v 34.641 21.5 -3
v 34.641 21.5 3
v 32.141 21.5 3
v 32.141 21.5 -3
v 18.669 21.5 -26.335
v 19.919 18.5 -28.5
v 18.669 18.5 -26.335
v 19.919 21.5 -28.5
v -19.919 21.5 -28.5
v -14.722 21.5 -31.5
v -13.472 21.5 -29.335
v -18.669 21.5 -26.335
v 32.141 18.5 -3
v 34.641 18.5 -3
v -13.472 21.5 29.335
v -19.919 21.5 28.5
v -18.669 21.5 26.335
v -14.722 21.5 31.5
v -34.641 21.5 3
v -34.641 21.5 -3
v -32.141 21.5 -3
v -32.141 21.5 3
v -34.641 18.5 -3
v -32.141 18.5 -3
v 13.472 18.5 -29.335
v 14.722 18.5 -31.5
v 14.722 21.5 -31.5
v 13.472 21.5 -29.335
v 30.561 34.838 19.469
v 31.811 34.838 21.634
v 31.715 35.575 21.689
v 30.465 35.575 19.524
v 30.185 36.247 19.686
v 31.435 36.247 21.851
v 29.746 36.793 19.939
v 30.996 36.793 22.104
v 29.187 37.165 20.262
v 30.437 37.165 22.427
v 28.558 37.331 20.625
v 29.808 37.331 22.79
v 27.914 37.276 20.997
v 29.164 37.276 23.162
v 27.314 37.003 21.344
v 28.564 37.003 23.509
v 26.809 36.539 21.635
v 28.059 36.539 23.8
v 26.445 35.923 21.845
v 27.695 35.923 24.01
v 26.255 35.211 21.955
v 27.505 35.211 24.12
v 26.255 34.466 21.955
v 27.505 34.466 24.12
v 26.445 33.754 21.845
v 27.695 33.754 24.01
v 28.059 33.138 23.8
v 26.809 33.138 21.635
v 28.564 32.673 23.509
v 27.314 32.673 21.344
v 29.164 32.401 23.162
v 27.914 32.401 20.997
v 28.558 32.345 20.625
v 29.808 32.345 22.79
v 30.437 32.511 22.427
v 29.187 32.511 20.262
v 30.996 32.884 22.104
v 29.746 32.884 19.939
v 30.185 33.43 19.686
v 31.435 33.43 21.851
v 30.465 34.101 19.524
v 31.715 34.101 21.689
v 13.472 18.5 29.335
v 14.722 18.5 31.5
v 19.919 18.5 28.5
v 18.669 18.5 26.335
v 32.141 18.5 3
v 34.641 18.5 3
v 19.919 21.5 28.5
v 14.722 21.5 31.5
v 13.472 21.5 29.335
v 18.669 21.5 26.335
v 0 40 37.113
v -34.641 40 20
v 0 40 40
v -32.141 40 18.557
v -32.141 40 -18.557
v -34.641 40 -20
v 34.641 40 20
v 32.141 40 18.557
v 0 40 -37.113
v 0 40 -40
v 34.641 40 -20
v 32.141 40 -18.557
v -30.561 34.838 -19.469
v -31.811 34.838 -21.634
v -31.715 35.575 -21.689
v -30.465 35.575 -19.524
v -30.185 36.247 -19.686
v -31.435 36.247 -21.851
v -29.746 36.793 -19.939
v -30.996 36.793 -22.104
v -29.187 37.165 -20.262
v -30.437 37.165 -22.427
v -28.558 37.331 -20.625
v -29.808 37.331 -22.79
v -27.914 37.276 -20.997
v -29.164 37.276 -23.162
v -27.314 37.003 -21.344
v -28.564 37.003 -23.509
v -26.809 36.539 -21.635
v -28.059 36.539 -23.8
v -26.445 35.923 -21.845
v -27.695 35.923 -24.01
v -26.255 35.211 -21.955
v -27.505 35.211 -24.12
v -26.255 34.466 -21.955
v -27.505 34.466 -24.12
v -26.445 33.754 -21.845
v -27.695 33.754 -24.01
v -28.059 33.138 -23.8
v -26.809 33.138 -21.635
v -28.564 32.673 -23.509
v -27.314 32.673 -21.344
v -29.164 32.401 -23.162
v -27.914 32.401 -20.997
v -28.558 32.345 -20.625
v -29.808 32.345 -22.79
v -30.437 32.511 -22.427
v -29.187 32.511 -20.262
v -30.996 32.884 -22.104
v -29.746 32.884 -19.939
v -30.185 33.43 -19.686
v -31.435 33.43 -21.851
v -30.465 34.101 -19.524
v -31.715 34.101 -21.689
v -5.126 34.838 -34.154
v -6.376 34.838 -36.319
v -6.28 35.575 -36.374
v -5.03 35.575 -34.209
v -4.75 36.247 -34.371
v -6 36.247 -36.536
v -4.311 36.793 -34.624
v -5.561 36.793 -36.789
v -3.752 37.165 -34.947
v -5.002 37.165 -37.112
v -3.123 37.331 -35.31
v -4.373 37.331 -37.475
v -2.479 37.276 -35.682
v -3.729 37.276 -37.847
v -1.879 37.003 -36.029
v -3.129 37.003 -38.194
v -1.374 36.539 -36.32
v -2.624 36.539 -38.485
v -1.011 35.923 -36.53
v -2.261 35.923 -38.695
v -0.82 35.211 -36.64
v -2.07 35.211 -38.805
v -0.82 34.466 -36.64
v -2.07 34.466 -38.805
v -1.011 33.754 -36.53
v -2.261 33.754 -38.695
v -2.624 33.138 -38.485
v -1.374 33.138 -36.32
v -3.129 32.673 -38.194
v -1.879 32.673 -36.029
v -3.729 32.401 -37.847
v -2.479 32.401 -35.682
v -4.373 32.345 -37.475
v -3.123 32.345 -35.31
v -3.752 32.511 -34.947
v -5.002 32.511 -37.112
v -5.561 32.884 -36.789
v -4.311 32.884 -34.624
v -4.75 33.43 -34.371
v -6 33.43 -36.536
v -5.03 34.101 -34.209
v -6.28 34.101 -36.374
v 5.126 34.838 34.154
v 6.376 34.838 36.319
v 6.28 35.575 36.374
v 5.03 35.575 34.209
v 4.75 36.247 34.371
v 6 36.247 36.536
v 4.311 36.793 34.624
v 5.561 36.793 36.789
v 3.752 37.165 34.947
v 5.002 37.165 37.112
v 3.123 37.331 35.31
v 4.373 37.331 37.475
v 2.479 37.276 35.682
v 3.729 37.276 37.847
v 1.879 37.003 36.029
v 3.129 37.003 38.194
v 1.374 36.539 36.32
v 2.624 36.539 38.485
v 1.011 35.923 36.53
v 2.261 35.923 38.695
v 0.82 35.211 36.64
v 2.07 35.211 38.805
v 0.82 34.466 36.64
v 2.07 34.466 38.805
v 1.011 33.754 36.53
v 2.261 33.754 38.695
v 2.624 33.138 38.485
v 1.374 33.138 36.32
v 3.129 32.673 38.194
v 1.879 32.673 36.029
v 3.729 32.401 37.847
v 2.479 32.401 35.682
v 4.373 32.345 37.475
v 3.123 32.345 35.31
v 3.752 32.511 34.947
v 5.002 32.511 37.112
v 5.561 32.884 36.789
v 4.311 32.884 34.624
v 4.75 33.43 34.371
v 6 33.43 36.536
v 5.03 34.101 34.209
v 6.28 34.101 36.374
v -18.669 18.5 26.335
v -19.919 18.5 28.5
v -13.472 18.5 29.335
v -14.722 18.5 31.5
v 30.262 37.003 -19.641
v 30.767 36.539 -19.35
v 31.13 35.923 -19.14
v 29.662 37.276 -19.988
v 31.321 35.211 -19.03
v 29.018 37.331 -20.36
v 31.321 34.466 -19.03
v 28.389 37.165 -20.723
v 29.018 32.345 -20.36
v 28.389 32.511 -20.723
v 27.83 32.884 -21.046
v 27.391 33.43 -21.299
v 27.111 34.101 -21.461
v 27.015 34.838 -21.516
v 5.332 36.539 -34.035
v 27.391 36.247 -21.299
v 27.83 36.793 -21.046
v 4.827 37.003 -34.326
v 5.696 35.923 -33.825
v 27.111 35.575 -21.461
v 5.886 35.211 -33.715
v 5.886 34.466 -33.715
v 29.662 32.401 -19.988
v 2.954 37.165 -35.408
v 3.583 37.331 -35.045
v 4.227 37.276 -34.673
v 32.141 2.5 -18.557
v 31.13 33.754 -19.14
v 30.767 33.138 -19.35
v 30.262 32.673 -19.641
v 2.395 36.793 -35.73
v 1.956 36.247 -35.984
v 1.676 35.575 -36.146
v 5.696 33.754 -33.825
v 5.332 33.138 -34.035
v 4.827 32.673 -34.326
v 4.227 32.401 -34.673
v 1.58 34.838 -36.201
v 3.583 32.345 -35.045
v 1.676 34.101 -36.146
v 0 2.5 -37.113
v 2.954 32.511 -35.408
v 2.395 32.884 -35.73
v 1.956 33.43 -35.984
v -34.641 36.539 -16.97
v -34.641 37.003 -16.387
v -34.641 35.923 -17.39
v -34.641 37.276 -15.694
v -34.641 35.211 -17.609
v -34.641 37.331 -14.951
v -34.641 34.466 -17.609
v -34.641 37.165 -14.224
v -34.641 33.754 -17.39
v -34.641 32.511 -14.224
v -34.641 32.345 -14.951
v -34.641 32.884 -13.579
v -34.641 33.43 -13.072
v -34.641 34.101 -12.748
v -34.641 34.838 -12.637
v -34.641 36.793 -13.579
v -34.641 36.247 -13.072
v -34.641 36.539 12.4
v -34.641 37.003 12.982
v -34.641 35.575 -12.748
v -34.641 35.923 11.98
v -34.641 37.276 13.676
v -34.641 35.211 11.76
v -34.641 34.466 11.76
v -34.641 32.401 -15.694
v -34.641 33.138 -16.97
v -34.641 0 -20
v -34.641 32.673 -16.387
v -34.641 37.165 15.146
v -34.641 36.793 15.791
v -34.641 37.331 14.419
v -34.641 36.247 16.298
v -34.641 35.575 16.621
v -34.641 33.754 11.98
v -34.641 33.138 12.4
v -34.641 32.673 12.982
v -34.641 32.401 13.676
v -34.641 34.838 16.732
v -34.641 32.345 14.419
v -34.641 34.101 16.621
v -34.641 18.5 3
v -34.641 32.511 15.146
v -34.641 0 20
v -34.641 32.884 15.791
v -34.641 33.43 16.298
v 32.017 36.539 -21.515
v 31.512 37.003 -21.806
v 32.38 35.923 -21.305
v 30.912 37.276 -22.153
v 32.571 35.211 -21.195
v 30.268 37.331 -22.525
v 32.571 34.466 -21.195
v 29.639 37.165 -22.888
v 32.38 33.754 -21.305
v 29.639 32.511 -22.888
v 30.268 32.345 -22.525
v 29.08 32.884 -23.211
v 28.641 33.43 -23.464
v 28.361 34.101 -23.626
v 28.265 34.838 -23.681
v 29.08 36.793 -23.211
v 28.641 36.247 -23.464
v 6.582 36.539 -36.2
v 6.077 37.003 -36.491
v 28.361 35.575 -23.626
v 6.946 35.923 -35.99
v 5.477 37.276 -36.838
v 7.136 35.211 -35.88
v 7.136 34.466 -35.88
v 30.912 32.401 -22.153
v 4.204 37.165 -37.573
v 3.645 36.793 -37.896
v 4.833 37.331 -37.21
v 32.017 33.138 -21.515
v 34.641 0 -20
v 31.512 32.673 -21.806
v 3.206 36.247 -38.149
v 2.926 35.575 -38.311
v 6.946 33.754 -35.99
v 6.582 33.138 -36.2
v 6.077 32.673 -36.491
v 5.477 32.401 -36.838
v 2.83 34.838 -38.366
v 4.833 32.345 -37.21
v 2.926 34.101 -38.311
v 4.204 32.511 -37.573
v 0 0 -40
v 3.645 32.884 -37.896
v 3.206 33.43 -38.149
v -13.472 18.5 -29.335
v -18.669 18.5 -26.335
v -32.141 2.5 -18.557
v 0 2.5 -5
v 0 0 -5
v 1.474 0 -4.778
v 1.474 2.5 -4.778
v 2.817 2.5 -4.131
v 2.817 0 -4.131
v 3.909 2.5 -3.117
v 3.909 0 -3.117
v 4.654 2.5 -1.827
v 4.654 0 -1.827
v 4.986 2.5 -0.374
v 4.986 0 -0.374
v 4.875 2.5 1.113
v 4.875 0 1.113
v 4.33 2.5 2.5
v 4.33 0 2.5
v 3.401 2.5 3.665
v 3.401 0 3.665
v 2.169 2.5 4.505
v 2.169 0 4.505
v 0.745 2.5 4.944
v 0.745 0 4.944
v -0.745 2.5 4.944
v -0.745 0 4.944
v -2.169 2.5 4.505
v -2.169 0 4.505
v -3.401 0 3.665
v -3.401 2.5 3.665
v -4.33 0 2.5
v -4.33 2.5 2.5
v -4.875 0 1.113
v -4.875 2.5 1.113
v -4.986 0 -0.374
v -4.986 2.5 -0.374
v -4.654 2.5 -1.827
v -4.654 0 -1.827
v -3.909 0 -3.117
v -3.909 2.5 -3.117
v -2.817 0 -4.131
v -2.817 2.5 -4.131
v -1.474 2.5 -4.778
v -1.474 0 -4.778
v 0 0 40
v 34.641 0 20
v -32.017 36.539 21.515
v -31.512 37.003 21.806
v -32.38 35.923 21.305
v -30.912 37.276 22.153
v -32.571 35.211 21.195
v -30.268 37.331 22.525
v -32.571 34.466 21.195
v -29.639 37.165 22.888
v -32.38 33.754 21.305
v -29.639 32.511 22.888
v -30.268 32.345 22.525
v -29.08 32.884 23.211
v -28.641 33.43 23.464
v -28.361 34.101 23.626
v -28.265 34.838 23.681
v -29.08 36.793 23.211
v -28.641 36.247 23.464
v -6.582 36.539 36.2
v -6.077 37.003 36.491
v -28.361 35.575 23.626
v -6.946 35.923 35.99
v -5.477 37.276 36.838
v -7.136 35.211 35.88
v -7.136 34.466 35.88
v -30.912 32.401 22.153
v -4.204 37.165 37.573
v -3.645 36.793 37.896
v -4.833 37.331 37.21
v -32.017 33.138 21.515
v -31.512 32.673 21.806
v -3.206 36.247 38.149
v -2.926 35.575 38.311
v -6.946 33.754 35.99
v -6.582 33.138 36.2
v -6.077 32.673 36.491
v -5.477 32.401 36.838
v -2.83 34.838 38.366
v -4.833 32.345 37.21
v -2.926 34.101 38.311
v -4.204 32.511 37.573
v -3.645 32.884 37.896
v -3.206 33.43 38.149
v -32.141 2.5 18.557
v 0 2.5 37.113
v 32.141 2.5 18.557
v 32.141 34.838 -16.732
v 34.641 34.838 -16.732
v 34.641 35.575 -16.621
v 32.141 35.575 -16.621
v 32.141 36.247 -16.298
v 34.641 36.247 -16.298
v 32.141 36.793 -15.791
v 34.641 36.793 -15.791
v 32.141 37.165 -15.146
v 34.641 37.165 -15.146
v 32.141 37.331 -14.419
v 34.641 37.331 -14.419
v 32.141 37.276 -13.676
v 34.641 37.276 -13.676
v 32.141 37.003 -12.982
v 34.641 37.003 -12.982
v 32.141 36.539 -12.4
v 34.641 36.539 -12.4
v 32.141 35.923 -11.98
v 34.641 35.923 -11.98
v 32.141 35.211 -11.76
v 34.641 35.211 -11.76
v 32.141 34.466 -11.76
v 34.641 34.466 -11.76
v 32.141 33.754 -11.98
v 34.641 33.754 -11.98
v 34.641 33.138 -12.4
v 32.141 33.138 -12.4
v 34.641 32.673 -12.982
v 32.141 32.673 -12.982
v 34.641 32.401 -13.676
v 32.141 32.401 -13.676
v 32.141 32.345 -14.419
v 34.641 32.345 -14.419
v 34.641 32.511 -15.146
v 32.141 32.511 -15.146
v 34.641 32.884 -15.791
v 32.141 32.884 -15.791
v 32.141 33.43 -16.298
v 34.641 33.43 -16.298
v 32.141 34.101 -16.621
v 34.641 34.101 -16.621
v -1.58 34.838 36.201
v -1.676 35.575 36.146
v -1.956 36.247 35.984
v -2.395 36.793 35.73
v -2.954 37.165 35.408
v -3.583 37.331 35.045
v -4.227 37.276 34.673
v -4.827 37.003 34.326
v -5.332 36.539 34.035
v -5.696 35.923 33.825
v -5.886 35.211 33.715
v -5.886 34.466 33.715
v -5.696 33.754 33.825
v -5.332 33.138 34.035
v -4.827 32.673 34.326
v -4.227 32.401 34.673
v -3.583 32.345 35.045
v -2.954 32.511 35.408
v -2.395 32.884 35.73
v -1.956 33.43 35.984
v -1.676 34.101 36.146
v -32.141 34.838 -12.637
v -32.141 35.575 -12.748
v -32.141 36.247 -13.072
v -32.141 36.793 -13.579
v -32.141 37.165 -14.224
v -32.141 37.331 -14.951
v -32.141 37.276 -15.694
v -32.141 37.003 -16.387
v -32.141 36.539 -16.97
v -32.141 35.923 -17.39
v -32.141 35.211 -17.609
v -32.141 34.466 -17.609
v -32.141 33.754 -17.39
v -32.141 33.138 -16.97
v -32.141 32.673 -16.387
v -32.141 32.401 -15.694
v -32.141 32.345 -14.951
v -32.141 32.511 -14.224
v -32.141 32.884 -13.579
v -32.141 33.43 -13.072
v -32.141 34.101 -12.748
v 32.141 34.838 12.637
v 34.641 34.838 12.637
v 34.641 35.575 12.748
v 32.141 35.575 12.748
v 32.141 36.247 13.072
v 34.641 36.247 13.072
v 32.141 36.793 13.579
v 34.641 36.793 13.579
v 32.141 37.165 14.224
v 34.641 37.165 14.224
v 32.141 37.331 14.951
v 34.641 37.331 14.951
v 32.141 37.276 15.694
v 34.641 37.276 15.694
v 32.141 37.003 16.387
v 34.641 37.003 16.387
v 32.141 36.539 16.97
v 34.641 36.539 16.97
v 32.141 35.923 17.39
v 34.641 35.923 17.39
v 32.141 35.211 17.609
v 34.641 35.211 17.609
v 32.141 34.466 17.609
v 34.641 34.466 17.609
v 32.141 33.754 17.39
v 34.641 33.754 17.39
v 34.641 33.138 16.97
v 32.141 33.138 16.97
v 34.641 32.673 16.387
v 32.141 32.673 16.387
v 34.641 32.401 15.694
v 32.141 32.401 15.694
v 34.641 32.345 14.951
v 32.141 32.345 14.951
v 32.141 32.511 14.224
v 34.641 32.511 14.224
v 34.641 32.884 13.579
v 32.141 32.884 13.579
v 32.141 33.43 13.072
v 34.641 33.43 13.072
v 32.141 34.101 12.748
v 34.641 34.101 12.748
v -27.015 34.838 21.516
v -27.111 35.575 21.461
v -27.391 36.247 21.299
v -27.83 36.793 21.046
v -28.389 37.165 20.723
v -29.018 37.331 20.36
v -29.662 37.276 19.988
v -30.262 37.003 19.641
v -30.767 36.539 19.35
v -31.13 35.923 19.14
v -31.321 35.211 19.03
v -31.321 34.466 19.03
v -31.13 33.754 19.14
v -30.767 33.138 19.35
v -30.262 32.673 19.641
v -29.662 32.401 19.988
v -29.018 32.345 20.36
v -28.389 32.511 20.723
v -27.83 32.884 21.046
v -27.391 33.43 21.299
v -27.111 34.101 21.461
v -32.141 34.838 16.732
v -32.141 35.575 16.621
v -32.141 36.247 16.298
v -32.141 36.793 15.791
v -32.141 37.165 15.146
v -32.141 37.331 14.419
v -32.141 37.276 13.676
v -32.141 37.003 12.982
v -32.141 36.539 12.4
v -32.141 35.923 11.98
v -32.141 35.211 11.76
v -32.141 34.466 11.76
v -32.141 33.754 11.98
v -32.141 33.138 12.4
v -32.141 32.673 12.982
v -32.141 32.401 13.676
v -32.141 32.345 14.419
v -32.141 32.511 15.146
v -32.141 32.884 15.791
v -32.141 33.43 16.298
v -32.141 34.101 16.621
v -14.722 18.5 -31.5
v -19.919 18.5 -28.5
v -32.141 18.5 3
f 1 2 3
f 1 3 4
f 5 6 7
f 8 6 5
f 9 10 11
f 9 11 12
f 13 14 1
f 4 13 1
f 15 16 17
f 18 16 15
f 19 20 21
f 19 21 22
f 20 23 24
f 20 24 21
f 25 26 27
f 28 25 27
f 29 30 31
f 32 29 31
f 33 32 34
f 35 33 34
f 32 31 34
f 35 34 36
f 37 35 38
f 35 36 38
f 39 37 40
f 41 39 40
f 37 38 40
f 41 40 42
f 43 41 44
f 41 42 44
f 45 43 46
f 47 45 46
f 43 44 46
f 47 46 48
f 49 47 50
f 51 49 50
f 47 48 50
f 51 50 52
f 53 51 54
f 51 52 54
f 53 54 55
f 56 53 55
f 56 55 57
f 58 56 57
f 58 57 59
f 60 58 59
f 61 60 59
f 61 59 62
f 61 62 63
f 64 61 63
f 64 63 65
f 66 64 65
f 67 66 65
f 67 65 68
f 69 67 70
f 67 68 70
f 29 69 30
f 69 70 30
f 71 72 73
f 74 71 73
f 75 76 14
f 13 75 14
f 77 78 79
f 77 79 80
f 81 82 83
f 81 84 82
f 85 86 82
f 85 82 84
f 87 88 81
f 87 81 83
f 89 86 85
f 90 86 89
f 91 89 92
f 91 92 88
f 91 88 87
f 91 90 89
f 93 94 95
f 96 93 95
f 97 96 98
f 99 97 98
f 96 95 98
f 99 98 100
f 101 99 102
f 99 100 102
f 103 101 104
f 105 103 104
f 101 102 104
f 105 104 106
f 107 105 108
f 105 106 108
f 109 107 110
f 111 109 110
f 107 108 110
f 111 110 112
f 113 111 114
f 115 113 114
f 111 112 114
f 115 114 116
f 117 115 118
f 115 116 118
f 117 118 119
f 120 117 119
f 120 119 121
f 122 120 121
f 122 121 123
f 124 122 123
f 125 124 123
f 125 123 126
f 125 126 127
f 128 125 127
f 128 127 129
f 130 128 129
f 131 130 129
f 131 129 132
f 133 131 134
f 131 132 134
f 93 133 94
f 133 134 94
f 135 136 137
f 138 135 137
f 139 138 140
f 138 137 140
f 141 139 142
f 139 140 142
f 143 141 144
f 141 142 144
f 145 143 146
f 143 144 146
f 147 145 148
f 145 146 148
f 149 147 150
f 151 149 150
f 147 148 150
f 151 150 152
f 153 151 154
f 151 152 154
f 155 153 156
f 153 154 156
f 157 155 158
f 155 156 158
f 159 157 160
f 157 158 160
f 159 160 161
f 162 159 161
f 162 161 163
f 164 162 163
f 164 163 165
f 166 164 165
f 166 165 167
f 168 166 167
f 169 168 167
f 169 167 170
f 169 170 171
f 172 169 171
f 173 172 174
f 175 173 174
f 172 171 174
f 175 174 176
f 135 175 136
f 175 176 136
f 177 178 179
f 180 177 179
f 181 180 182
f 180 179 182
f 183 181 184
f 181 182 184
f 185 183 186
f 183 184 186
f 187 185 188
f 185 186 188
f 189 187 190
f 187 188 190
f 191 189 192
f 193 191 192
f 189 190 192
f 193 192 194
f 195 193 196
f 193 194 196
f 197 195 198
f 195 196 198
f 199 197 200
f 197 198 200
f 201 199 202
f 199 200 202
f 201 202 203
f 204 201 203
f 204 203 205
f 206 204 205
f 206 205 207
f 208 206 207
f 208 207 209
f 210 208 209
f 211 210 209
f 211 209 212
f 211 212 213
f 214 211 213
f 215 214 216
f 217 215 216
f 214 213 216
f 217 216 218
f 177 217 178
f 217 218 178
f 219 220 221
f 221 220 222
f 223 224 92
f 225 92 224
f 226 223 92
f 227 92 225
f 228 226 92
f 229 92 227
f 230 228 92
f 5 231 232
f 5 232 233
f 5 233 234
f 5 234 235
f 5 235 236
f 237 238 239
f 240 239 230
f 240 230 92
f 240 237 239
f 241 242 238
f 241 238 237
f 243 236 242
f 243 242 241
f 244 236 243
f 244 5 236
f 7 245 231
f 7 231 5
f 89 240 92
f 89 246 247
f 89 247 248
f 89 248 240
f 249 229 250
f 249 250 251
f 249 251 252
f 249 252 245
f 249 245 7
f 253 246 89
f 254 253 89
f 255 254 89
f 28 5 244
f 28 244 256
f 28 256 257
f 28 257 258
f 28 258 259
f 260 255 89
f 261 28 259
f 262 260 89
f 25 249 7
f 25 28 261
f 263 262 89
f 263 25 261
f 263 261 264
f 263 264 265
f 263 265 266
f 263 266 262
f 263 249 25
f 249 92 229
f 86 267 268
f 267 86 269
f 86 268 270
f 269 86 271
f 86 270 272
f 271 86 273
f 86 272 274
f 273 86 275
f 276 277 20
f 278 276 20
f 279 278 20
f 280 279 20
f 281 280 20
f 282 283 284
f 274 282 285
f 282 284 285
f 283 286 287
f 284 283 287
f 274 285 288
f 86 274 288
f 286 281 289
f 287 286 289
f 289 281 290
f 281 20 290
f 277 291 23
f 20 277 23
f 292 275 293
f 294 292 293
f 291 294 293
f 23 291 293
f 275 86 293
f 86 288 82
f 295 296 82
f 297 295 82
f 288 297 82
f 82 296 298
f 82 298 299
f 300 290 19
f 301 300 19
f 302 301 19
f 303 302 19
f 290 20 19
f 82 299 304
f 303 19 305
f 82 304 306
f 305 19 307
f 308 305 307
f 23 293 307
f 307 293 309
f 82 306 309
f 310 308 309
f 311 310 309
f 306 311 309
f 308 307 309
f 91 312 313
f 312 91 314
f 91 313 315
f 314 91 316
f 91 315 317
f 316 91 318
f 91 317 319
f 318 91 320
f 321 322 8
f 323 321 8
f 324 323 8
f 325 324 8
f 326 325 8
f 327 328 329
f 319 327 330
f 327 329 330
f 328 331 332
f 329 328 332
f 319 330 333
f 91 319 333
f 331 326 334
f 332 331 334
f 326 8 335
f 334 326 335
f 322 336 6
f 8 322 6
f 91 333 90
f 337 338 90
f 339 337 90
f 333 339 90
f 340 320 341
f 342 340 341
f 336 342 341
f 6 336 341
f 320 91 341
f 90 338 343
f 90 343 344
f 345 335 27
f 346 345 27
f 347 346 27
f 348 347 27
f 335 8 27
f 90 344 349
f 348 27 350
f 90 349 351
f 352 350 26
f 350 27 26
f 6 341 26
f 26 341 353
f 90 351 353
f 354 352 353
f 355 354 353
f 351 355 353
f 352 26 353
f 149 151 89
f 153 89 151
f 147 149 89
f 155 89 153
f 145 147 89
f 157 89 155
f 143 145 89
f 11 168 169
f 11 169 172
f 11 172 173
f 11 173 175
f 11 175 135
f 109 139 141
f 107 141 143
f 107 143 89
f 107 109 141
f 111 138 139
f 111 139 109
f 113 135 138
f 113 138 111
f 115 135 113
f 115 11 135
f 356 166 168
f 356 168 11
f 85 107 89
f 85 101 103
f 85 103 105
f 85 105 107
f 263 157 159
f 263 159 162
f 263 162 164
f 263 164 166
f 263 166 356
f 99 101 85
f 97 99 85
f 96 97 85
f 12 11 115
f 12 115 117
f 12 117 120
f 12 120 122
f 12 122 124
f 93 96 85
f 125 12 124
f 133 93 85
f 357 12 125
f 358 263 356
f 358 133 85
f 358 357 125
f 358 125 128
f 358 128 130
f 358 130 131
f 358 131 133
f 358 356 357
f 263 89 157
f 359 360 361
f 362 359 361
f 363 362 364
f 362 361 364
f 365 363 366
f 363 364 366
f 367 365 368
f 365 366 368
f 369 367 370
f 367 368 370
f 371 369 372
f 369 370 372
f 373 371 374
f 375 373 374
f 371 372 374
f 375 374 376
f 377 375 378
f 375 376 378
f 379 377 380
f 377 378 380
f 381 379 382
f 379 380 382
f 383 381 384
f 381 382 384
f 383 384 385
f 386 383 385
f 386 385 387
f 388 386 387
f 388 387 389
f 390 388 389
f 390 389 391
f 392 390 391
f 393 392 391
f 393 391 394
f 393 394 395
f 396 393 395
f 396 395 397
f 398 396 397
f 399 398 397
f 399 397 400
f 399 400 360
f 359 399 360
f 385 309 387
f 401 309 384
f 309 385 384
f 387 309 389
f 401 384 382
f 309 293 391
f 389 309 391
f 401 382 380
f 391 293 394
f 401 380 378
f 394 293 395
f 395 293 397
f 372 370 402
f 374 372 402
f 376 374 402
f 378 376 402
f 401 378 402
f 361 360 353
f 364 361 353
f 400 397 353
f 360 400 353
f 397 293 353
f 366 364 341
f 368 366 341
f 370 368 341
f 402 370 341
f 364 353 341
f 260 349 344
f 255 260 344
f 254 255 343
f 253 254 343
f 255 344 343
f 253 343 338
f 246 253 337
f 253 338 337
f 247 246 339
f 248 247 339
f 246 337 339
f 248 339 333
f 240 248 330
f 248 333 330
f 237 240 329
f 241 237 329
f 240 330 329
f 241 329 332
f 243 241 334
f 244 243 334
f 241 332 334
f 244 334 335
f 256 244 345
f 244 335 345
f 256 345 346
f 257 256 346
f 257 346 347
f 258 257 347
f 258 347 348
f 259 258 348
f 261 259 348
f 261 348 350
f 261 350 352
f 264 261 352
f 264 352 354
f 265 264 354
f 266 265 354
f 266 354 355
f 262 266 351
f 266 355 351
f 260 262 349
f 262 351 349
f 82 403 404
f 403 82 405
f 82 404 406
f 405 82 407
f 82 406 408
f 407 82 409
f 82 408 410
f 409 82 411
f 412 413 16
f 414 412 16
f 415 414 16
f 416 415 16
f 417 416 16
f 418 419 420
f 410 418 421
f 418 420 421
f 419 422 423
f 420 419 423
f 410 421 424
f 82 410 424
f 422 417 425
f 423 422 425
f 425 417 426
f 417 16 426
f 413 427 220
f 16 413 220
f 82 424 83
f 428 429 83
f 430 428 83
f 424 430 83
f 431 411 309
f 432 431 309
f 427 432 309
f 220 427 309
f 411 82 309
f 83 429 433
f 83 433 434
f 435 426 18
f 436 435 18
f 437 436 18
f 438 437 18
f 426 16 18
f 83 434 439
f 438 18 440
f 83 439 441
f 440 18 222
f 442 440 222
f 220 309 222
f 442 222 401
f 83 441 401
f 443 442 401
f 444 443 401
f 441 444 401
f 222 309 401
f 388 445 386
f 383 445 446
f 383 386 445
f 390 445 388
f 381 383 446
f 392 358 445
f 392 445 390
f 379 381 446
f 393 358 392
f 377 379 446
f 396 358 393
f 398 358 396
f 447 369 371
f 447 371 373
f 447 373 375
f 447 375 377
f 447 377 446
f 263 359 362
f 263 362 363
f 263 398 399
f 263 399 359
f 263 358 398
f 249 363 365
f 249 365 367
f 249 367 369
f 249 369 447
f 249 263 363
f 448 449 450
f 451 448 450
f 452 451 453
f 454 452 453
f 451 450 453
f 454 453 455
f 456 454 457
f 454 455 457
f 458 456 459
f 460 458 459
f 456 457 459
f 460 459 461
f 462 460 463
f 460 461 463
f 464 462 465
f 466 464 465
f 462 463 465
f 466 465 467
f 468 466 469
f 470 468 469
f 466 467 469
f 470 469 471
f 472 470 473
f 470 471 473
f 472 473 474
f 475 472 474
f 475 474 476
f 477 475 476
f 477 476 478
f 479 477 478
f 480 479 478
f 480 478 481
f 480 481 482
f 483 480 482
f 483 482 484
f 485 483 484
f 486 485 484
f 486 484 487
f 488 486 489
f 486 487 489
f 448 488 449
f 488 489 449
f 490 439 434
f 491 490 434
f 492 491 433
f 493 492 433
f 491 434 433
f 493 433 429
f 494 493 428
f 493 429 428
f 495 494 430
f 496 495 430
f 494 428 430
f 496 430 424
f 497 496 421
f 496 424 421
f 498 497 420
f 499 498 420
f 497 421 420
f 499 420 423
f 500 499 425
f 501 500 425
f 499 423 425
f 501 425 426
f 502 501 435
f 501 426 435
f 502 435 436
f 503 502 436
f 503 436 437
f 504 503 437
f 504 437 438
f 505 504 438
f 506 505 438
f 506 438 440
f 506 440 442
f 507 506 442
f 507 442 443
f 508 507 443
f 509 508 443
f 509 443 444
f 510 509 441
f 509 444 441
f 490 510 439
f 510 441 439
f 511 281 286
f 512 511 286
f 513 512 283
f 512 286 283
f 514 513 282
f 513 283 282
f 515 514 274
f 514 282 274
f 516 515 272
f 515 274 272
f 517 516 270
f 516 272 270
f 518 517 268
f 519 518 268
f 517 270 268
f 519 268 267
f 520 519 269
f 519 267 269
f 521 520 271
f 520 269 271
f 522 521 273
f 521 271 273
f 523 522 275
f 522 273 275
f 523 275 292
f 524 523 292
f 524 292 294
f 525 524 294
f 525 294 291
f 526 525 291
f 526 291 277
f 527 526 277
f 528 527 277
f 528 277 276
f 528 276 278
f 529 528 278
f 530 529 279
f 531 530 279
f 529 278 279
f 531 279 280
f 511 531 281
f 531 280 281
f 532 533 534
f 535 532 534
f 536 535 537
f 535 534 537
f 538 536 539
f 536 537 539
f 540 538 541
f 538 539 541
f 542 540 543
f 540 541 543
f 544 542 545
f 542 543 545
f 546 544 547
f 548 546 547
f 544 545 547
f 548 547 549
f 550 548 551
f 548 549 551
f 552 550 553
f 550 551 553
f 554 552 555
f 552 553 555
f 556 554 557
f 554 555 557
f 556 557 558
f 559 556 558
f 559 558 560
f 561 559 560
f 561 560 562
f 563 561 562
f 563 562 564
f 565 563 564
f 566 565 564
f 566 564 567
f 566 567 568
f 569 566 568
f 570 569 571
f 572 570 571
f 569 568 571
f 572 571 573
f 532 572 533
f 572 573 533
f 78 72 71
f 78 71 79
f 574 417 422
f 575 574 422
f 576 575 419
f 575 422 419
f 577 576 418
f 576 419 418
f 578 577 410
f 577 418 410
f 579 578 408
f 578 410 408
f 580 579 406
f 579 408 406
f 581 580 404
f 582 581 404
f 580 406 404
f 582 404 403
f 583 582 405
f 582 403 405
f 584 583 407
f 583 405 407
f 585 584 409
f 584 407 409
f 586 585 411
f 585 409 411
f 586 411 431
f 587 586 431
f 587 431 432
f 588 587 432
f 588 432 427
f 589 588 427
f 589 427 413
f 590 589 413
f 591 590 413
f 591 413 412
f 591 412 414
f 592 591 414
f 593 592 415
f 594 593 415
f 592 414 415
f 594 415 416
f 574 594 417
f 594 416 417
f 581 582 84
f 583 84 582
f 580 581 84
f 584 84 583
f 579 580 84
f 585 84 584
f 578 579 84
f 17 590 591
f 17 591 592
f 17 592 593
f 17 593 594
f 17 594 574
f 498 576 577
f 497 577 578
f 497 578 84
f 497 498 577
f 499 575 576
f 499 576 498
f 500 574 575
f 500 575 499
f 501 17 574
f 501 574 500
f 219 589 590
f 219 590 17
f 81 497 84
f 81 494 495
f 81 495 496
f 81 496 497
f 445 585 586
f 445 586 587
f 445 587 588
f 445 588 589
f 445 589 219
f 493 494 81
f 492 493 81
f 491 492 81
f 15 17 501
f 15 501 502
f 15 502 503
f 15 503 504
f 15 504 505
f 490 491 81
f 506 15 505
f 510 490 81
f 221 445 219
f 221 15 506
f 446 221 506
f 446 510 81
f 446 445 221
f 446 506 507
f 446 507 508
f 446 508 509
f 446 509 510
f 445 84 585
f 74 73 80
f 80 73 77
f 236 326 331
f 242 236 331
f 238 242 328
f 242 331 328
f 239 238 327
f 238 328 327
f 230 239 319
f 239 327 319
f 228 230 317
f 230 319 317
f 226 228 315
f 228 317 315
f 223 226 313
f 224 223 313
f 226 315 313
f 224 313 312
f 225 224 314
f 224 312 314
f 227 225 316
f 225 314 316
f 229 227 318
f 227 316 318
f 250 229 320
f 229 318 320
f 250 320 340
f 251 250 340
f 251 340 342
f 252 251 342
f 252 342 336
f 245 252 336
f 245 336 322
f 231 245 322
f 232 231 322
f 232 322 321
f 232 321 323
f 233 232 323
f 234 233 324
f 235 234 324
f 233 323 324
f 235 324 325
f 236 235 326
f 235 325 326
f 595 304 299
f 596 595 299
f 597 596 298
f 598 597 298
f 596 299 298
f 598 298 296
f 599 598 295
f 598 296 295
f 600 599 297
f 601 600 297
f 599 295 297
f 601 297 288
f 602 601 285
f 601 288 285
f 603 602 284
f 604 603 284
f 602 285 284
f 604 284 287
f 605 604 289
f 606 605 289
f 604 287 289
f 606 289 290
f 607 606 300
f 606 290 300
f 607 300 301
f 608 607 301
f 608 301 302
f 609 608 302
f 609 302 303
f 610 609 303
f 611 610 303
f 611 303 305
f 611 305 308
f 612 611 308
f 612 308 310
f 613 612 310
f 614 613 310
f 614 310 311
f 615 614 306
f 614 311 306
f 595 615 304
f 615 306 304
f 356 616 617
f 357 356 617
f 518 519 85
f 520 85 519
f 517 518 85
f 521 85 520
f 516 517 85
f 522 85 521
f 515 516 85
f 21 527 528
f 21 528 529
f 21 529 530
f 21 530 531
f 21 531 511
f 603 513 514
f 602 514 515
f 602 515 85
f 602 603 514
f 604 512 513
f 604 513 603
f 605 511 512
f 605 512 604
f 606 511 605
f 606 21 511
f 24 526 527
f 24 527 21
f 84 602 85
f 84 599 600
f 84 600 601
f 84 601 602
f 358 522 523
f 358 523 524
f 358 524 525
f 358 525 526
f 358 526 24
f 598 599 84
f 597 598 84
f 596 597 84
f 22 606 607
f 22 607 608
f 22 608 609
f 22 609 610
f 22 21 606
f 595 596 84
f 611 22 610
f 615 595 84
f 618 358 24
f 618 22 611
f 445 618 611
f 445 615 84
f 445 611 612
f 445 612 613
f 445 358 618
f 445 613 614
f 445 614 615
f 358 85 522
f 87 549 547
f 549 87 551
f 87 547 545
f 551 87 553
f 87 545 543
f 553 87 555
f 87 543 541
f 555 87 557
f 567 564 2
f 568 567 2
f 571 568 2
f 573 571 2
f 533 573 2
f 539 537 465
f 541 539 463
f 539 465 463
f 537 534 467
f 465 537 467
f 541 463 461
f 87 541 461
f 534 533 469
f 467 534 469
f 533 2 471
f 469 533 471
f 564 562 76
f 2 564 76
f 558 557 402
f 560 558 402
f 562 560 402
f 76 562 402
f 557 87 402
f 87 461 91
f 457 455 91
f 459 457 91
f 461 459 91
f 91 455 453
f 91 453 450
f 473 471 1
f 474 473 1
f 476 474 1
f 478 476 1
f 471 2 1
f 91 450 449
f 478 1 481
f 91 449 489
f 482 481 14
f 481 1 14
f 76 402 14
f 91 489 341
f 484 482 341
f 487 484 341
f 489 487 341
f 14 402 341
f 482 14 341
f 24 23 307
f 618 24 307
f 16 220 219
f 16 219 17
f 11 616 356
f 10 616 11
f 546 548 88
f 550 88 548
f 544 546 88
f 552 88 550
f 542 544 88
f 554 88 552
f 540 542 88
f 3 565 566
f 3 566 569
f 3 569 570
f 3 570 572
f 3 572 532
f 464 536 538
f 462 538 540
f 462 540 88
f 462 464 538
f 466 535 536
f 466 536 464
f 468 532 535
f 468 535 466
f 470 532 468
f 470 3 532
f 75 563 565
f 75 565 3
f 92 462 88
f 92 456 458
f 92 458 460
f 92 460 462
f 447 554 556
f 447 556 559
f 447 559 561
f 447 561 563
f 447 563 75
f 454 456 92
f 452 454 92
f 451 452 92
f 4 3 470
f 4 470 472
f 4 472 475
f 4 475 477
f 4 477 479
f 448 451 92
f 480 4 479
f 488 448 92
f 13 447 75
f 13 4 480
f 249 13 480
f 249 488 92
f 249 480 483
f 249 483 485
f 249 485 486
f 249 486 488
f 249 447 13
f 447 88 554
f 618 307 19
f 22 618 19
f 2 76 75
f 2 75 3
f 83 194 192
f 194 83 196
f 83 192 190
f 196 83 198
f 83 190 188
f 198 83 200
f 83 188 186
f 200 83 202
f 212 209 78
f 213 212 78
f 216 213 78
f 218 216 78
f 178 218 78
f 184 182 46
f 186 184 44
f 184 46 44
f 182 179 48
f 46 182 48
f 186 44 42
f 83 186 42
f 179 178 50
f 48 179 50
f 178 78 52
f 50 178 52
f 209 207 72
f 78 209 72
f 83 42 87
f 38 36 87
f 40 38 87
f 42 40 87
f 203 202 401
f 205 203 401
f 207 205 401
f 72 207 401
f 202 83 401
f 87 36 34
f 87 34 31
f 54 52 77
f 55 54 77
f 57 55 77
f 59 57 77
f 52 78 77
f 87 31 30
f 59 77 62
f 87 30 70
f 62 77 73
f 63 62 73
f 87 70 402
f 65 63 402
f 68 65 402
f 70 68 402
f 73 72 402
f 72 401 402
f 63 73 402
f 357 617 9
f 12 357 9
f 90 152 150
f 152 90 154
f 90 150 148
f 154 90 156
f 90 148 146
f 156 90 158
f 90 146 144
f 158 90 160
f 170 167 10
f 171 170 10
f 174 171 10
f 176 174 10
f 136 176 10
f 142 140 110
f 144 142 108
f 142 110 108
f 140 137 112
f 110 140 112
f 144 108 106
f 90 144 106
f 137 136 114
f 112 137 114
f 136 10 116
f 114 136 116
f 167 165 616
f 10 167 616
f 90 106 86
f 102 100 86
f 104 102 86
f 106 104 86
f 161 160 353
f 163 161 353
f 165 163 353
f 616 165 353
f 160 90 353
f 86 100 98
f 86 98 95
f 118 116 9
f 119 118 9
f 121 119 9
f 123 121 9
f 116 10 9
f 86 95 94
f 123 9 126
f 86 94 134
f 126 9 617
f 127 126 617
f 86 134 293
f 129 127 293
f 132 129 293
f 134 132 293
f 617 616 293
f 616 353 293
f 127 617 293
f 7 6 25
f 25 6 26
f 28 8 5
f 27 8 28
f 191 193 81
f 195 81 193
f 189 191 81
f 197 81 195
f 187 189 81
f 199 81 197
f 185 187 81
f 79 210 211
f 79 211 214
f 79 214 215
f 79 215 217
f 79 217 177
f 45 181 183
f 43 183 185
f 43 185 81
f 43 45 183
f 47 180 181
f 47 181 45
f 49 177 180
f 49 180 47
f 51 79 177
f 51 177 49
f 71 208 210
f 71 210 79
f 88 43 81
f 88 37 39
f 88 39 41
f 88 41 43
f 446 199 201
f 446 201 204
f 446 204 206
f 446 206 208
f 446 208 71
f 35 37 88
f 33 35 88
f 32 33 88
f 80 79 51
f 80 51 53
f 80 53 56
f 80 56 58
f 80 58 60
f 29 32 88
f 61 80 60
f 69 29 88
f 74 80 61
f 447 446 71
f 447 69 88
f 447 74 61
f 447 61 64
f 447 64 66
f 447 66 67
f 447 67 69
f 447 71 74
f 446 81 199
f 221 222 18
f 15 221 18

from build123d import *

# Parameters (mm, degrees)
BOSS_EXTRUDE1_DEPTH = 40
SHELL1_T            = -2.5
SKETCH2_R           = 5
CUT_EXTRUDE1_DEPTH  = 40
SKETCH3_R           = 2.5
CUT_EXTRUDE2_DEPTH  = 2.5
SKETCH4_W           = 6
SKETCH4_H           = 3
CUT_EXTRUDE3_DEPTH  = 40
CIRPATTERN1_COUNT   = 6


with BuildPart() as part:
    # Sketch1 → Boss-Extrude1 (new body)
    with BuildSketch(Plane(origin=(0, 0, 0), x_dir=(1, 0, 0), z_dir=(0, 1, 0))):
        Polygon((34.641016151, 20), (0, 40), (-34.641016151, 20), (-34.641016151, -20), (0, -40), (34.641016151, -20), align=None)
    extrude(amount=BOSS_EXTRUDE1_DEPTH)

    # Shell1
    shell1_openings = [part.faces().sort_by_distance(p)[0] for p in [
        (0, 40, 0),
    ]]
    offset(amount=SHELL1_T, openings=shell1_openings, kind=Kind.INTERSECTION)

    # Sketch2 → Cut-Extrude1 (cut)
    with BuildSketch(Plane.XZ):
        with Locations(Location((0, 0, 0), (0, 0, 270))):
            Circle(SKETCH2_R)
    extrude(amount=-CUT_EXTRUDE1_DEPTH, mode=Mode.SUBTRACT)

    # Sketch3 → Cut-Extrude2 (cut)
    with BuildSketch(Plane.ZY.offset(34.641016151)):
        with Locations((-15.137351835, 34.838276852)):
            Circle(SKETCH3_R)
        with Locations((14.232401454, 34.838276852)):
            Circle(SKETCH3_R)
    cut_extrude2 = extrude(amount=-CUT_EXTRUDE2_DEPTH, mode=Mode.SUBTRACT)

    # Sketch4 → Cut-Extrude3 (cut)
    with BuildSketch(Plane.ZY.offset(34.641016151)):
        with Locations((0, 20)):
            Rectangle(SKETCH4_W, SKETCH4_H)
    cut_extrude3 = extrude(amount=-CUT_EXTRUDE3_DEPTH, mode=Mode.SUBTRACT)

    # CirPattern1: Cut-Extrude2, Cut-Extrude3 ×6 about axis
    cirpattern1_axis = Axis((0, 0, 0), (0, 1, 0))
    add([cut_extrude2.rotate(cirpattern1_axis, i * 360 / CIRPATTERN1_COUNT) for i in range(1, CIRPATTERN1_COUNT)], mode=Mode.SUBTRACT)
    add([cut_extrude3.rotate(cirpattern1_axis, i * 360 / CIRPATTERN1_COUNT) for i in range(1, CIRPATTERN1_COUNT)], mode=Mode.SUBTRACT)


solid = part.part
